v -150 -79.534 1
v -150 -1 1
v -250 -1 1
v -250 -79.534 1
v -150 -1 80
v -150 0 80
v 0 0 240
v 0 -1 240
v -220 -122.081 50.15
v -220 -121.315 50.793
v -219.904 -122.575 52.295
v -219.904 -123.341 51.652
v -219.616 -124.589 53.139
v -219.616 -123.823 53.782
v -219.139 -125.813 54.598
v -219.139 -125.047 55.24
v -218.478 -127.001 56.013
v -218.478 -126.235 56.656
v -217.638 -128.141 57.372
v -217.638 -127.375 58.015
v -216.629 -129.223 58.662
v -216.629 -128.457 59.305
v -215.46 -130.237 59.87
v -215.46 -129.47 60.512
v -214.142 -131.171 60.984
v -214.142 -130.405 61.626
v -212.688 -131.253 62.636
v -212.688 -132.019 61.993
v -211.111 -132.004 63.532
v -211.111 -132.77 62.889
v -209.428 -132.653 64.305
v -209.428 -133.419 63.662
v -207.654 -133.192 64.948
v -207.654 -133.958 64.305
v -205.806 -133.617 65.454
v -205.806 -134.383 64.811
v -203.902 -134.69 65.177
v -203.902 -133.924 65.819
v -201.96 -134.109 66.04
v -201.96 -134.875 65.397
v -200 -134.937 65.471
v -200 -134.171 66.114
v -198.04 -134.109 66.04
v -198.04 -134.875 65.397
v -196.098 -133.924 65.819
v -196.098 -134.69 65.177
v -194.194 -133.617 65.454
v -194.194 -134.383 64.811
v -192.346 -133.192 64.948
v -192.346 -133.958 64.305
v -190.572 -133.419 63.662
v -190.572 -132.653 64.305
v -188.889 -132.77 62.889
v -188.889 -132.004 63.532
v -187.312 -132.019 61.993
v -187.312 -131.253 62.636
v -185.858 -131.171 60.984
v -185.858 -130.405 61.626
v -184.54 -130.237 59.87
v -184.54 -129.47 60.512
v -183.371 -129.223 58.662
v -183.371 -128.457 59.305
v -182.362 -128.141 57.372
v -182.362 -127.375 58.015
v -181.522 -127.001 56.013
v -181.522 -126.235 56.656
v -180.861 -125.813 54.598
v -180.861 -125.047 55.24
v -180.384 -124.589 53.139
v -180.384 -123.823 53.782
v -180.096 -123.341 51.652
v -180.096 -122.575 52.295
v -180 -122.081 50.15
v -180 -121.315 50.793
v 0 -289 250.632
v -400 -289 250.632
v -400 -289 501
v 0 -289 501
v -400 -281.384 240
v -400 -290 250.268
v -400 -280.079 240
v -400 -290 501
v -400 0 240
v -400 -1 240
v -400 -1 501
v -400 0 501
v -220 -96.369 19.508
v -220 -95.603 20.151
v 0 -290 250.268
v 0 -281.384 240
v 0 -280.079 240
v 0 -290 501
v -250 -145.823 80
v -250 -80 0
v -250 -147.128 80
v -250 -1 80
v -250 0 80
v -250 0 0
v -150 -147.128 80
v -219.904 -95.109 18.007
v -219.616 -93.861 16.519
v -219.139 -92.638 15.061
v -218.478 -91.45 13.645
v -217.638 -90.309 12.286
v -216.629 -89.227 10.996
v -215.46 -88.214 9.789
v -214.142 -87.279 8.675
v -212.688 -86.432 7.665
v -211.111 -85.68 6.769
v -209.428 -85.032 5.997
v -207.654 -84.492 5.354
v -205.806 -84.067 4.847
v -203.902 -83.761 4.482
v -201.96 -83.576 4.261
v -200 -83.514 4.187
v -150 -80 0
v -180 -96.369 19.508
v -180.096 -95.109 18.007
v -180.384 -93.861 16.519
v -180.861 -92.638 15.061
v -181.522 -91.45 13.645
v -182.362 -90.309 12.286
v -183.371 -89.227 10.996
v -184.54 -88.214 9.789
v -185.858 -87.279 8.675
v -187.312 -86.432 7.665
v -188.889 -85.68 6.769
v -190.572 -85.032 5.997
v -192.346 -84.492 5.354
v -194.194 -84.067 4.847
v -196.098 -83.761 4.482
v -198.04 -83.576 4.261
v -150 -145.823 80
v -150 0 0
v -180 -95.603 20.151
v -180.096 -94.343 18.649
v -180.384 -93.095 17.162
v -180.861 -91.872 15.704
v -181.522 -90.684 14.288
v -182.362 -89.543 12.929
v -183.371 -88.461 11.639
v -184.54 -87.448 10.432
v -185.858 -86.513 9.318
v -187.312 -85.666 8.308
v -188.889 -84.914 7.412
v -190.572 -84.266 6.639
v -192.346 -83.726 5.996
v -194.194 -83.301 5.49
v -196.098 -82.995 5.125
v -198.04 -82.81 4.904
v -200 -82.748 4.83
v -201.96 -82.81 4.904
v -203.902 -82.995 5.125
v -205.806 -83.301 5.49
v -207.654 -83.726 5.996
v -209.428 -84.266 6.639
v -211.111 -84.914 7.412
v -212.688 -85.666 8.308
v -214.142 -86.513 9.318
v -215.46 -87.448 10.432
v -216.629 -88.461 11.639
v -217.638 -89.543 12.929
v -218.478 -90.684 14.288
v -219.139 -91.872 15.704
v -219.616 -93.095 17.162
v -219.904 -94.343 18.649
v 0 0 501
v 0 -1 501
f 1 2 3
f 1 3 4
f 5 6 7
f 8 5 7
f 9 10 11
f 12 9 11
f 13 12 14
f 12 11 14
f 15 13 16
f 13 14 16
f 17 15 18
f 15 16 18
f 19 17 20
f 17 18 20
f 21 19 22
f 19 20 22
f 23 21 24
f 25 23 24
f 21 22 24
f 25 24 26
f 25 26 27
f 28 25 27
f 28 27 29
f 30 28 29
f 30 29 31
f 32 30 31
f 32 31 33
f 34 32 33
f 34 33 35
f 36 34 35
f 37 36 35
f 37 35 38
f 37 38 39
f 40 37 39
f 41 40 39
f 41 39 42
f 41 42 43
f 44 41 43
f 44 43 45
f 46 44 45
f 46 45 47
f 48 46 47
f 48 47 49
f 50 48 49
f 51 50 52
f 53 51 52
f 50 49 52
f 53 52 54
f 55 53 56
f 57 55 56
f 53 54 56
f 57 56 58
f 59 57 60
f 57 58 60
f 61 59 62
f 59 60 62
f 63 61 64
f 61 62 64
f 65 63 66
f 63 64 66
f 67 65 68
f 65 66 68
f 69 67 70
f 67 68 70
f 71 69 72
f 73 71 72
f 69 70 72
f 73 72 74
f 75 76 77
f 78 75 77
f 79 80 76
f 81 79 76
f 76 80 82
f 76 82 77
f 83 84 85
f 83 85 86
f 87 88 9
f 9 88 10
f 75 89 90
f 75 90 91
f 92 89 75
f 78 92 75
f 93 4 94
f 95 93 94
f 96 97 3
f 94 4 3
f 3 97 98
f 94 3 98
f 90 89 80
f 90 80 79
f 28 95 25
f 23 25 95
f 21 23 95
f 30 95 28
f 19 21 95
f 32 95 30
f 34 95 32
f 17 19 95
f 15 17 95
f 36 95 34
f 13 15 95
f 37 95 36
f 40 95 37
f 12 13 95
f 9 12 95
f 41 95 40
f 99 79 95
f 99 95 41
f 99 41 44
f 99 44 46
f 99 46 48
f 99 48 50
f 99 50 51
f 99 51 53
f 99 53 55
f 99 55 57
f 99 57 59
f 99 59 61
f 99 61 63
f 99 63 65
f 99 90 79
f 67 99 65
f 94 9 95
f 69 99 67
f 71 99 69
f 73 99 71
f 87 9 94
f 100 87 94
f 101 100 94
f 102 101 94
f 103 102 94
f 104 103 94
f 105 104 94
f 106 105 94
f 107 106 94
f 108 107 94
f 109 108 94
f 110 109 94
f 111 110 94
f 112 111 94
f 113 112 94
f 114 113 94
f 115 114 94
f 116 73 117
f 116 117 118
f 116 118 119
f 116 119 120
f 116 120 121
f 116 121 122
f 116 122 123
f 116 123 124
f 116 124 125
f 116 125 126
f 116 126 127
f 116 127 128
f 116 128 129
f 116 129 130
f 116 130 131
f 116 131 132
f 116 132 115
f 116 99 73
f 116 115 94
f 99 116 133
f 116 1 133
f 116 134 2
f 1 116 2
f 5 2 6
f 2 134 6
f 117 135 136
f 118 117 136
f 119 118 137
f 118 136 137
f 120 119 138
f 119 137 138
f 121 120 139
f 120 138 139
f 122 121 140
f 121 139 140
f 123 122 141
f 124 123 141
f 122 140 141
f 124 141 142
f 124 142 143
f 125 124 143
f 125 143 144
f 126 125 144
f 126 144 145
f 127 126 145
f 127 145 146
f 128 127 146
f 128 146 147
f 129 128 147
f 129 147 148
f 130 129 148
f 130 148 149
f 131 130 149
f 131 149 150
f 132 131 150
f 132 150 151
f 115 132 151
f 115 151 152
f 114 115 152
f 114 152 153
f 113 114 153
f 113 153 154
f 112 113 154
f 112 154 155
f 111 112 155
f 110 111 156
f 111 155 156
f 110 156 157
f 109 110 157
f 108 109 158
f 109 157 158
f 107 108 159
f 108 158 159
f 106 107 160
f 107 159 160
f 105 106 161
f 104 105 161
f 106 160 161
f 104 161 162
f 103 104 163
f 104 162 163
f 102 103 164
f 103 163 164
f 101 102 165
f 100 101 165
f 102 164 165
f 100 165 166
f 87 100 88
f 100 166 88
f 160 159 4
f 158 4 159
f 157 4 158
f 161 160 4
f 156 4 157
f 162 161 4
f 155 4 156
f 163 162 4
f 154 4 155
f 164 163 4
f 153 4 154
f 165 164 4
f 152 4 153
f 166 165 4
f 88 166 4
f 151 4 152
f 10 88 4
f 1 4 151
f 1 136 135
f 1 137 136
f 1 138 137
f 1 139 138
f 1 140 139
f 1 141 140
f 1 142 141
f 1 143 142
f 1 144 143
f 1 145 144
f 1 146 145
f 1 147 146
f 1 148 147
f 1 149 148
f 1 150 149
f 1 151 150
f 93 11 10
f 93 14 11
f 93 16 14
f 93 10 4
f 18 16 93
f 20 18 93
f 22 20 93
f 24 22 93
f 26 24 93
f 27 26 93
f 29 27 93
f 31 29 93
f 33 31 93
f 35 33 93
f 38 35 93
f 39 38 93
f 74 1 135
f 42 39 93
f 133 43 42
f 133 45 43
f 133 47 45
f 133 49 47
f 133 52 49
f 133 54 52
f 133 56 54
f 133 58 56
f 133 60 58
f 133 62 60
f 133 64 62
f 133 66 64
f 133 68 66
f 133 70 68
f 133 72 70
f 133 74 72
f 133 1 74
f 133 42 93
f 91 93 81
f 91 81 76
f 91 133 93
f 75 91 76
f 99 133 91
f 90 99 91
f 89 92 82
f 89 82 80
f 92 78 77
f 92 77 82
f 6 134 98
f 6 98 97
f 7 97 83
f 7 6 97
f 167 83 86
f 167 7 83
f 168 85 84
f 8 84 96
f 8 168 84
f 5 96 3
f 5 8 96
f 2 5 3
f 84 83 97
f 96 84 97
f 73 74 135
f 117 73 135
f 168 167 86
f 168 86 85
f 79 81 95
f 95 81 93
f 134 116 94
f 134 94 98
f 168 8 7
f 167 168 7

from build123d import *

# Parameters (mm, degrees)
F1_DEPTH = 400
F3_DEPTH = 290.001
F5_DEPTH = 161.870333055


# Not quite as in the source:
# - a feature names something its author has since deleted; it is built from what else it names


with BuildPart() as f1:
    # F0 (on Right) → F1 (new body)
    with BuildSketch(Plane.YZ):
        Polygon((-80, 0), (0, 0), (0, 501), (-1, 501), (-1, 1), (-79.5336923418, 1), (-289, 250.6322246791), (-289, 501), (-290, 501), (-290, 250.2682544448), align=None)
    extrude(amount=-F1_DEPTH)

    # F2 (on face) → F3 (cut, through all)
    with BuildSketch(Plane(origin=(0, 0, 0), x_dir=(-1, 0, 0), z_dir=(0, 1, 0))):
        Polygon((400, 0), (400, 240), (250, 80), (250, 0), align=None)
        Polygon((0, 0), (150, 0), (150, 80), (0, 240), align=None)
    extrude(amount=-F3_DEPTH, mode=Mode.SUBTRACT)

    # F4 (on face) → F5 (cut, through all)
    with BuildSketch(Plane(origin=(0, -46.1798826636, -38.7495225108), x_dir=(-1, 0, 0), z_dir=(0, 0.7660444431, 0.6427876097))):
        with BuildLine():
            Line((180, 116.8893164331), (180, 76.8893164331))
            ThreePointArc((180, 76.8893164331), (200, 56.8893164331), (220, 76.8893164331))
            Line((220, 76.8893164331), (220, 116.8893164331))
            ThreePointArc((220, 116.8893164331), (200, 136.8893164331), (180, 116.8893164331))
        make_face()
    extrude(amount=-F5_DEPTH, mode=Mode.SUBTRACT)


solid = f1.part
